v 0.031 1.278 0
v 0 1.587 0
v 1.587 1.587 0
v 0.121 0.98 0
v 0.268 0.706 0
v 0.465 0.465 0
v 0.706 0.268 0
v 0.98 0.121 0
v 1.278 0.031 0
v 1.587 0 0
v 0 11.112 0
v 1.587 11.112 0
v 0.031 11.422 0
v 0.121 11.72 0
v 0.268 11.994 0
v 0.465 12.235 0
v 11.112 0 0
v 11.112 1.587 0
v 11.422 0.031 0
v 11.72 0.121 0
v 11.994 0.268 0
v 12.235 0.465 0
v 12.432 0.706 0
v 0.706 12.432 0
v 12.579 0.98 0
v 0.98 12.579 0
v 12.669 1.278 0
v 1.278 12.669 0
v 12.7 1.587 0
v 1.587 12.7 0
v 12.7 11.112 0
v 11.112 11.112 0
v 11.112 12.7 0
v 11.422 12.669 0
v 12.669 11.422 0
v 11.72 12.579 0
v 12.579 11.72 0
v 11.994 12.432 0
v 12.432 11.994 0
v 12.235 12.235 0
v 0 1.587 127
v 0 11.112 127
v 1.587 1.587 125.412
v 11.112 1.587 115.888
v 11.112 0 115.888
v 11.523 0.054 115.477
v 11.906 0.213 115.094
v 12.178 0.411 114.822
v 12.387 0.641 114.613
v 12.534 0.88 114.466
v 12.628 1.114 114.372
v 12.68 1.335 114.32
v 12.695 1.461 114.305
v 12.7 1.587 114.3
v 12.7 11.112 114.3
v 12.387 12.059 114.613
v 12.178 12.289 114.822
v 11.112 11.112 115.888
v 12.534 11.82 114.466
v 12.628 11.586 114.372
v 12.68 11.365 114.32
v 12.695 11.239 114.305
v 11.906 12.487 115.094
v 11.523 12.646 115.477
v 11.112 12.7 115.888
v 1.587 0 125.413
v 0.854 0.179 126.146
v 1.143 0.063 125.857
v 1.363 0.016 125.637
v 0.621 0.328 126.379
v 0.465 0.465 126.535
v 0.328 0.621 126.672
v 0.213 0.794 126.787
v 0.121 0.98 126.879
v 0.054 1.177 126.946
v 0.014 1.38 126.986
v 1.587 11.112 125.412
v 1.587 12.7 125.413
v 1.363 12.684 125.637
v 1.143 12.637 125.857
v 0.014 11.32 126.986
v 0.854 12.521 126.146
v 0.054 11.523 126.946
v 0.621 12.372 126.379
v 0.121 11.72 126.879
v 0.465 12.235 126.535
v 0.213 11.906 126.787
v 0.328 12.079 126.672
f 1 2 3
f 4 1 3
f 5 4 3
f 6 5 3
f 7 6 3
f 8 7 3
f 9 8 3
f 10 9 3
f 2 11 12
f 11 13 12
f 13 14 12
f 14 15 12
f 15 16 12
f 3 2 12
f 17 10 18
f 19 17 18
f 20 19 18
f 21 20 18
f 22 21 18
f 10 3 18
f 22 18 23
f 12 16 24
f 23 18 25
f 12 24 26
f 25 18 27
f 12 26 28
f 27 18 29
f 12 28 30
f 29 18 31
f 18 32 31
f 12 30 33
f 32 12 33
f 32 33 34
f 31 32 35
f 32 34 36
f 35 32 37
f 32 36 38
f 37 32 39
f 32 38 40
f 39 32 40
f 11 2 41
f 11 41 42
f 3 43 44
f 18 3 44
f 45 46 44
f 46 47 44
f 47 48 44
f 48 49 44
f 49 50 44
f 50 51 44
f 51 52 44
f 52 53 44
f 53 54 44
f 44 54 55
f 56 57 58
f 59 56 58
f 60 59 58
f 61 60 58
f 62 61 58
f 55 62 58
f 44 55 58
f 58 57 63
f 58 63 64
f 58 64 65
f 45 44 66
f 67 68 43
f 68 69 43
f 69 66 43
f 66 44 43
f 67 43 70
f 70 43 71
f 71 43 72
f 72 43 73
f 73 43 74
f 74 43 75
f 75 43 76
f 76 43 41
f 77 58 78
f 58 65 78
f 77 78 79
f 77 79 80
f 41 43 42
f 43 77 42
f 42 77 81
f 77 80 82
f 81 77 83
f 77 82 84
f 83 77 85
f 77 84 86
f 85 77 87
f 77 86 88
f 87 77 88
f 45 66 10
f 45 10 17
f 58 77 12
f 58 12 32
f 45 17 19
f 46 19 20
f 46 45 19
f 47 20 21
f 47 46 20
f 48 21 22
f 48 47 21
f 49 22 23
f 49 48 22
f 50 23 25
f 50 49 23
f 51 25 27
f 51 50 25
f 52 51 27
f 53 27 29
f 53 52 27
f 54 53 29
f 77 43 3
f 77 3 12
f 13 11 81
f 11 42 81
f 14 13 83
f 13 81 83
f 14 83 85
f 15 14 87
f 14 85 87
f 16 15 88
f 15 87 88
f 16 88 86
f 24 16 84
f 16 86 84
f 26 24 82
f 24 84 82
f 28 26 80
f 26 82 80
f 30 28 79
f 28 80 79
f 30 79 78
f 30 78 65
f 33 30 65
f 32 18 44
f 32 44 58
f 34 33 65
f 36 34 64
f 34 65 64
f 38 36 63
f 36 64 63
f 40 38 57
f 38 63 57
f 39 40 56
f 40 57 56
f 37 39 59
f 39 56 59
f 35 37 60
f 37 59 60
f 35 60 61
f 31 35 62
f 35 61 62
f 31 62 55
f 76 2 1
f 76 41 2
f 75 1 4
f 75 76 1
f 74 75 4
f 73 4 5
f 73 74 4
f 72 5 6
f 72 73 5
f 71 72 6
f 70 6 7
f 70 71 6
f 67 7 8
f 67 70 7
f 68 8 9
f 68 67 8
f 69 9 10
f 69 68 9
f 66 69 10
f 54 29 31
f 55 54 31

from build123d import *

# Parameters (mm, degrees)
SKETCH1_W           = 12.7
SKETCH1_H           = 12.7
SKETCH1_W_2         = 9.525
SKETCH1_H_2         = 9.525
BOSS_EXTRUDE1_DEPTH = 127
CUT_EXTRUDE1_DEPTH  = 13.7
FILLET1_R           = 1.5875


with BuildPart() as part:
    # Sketch1 → Boss-Extrude1 (new body)
    with BuildSketch(Plane.XY):
        with Locations((6.35, 6.35)):
            Rectangle(SKETCH1_W, SKETCH1_H)
        with Locations((6.35, 6.35)):
            Rectangle(SKETCH1_W_2, SKETCH1_H_2, mode=Mode.SUBTRACT)
    extrude(amount=BOSS_EXTRUDE1_DEPTH)

    # Sketch2 → Cut-Extrude1 (cut, through all)
    with BuildSketch(Plane(origin=(0, 12.7, 0), x_dir=(1, 0, 0), z_dir=(0, 1, 0))):
        Polygon((0, -127), (12.7, -127), (12.7, -114.3), align=None)
    extrude(amount=-CUT_EXTRUDE1_DEPTH, mode=Mode.SUBTRACT)

    # Fillet1
    fillet1_edges = [part.edges().sort_by_distance(p)[0] for p in [
        (12.7, 12.7, 57.15),
        (12.7, 0, 57.15),
        (0, 12.7, 63.5),
        (0, 0, 63.5),
    ]]
    fillet(fillet1_edges, radius=FILLET1_R)


solid = part.part
